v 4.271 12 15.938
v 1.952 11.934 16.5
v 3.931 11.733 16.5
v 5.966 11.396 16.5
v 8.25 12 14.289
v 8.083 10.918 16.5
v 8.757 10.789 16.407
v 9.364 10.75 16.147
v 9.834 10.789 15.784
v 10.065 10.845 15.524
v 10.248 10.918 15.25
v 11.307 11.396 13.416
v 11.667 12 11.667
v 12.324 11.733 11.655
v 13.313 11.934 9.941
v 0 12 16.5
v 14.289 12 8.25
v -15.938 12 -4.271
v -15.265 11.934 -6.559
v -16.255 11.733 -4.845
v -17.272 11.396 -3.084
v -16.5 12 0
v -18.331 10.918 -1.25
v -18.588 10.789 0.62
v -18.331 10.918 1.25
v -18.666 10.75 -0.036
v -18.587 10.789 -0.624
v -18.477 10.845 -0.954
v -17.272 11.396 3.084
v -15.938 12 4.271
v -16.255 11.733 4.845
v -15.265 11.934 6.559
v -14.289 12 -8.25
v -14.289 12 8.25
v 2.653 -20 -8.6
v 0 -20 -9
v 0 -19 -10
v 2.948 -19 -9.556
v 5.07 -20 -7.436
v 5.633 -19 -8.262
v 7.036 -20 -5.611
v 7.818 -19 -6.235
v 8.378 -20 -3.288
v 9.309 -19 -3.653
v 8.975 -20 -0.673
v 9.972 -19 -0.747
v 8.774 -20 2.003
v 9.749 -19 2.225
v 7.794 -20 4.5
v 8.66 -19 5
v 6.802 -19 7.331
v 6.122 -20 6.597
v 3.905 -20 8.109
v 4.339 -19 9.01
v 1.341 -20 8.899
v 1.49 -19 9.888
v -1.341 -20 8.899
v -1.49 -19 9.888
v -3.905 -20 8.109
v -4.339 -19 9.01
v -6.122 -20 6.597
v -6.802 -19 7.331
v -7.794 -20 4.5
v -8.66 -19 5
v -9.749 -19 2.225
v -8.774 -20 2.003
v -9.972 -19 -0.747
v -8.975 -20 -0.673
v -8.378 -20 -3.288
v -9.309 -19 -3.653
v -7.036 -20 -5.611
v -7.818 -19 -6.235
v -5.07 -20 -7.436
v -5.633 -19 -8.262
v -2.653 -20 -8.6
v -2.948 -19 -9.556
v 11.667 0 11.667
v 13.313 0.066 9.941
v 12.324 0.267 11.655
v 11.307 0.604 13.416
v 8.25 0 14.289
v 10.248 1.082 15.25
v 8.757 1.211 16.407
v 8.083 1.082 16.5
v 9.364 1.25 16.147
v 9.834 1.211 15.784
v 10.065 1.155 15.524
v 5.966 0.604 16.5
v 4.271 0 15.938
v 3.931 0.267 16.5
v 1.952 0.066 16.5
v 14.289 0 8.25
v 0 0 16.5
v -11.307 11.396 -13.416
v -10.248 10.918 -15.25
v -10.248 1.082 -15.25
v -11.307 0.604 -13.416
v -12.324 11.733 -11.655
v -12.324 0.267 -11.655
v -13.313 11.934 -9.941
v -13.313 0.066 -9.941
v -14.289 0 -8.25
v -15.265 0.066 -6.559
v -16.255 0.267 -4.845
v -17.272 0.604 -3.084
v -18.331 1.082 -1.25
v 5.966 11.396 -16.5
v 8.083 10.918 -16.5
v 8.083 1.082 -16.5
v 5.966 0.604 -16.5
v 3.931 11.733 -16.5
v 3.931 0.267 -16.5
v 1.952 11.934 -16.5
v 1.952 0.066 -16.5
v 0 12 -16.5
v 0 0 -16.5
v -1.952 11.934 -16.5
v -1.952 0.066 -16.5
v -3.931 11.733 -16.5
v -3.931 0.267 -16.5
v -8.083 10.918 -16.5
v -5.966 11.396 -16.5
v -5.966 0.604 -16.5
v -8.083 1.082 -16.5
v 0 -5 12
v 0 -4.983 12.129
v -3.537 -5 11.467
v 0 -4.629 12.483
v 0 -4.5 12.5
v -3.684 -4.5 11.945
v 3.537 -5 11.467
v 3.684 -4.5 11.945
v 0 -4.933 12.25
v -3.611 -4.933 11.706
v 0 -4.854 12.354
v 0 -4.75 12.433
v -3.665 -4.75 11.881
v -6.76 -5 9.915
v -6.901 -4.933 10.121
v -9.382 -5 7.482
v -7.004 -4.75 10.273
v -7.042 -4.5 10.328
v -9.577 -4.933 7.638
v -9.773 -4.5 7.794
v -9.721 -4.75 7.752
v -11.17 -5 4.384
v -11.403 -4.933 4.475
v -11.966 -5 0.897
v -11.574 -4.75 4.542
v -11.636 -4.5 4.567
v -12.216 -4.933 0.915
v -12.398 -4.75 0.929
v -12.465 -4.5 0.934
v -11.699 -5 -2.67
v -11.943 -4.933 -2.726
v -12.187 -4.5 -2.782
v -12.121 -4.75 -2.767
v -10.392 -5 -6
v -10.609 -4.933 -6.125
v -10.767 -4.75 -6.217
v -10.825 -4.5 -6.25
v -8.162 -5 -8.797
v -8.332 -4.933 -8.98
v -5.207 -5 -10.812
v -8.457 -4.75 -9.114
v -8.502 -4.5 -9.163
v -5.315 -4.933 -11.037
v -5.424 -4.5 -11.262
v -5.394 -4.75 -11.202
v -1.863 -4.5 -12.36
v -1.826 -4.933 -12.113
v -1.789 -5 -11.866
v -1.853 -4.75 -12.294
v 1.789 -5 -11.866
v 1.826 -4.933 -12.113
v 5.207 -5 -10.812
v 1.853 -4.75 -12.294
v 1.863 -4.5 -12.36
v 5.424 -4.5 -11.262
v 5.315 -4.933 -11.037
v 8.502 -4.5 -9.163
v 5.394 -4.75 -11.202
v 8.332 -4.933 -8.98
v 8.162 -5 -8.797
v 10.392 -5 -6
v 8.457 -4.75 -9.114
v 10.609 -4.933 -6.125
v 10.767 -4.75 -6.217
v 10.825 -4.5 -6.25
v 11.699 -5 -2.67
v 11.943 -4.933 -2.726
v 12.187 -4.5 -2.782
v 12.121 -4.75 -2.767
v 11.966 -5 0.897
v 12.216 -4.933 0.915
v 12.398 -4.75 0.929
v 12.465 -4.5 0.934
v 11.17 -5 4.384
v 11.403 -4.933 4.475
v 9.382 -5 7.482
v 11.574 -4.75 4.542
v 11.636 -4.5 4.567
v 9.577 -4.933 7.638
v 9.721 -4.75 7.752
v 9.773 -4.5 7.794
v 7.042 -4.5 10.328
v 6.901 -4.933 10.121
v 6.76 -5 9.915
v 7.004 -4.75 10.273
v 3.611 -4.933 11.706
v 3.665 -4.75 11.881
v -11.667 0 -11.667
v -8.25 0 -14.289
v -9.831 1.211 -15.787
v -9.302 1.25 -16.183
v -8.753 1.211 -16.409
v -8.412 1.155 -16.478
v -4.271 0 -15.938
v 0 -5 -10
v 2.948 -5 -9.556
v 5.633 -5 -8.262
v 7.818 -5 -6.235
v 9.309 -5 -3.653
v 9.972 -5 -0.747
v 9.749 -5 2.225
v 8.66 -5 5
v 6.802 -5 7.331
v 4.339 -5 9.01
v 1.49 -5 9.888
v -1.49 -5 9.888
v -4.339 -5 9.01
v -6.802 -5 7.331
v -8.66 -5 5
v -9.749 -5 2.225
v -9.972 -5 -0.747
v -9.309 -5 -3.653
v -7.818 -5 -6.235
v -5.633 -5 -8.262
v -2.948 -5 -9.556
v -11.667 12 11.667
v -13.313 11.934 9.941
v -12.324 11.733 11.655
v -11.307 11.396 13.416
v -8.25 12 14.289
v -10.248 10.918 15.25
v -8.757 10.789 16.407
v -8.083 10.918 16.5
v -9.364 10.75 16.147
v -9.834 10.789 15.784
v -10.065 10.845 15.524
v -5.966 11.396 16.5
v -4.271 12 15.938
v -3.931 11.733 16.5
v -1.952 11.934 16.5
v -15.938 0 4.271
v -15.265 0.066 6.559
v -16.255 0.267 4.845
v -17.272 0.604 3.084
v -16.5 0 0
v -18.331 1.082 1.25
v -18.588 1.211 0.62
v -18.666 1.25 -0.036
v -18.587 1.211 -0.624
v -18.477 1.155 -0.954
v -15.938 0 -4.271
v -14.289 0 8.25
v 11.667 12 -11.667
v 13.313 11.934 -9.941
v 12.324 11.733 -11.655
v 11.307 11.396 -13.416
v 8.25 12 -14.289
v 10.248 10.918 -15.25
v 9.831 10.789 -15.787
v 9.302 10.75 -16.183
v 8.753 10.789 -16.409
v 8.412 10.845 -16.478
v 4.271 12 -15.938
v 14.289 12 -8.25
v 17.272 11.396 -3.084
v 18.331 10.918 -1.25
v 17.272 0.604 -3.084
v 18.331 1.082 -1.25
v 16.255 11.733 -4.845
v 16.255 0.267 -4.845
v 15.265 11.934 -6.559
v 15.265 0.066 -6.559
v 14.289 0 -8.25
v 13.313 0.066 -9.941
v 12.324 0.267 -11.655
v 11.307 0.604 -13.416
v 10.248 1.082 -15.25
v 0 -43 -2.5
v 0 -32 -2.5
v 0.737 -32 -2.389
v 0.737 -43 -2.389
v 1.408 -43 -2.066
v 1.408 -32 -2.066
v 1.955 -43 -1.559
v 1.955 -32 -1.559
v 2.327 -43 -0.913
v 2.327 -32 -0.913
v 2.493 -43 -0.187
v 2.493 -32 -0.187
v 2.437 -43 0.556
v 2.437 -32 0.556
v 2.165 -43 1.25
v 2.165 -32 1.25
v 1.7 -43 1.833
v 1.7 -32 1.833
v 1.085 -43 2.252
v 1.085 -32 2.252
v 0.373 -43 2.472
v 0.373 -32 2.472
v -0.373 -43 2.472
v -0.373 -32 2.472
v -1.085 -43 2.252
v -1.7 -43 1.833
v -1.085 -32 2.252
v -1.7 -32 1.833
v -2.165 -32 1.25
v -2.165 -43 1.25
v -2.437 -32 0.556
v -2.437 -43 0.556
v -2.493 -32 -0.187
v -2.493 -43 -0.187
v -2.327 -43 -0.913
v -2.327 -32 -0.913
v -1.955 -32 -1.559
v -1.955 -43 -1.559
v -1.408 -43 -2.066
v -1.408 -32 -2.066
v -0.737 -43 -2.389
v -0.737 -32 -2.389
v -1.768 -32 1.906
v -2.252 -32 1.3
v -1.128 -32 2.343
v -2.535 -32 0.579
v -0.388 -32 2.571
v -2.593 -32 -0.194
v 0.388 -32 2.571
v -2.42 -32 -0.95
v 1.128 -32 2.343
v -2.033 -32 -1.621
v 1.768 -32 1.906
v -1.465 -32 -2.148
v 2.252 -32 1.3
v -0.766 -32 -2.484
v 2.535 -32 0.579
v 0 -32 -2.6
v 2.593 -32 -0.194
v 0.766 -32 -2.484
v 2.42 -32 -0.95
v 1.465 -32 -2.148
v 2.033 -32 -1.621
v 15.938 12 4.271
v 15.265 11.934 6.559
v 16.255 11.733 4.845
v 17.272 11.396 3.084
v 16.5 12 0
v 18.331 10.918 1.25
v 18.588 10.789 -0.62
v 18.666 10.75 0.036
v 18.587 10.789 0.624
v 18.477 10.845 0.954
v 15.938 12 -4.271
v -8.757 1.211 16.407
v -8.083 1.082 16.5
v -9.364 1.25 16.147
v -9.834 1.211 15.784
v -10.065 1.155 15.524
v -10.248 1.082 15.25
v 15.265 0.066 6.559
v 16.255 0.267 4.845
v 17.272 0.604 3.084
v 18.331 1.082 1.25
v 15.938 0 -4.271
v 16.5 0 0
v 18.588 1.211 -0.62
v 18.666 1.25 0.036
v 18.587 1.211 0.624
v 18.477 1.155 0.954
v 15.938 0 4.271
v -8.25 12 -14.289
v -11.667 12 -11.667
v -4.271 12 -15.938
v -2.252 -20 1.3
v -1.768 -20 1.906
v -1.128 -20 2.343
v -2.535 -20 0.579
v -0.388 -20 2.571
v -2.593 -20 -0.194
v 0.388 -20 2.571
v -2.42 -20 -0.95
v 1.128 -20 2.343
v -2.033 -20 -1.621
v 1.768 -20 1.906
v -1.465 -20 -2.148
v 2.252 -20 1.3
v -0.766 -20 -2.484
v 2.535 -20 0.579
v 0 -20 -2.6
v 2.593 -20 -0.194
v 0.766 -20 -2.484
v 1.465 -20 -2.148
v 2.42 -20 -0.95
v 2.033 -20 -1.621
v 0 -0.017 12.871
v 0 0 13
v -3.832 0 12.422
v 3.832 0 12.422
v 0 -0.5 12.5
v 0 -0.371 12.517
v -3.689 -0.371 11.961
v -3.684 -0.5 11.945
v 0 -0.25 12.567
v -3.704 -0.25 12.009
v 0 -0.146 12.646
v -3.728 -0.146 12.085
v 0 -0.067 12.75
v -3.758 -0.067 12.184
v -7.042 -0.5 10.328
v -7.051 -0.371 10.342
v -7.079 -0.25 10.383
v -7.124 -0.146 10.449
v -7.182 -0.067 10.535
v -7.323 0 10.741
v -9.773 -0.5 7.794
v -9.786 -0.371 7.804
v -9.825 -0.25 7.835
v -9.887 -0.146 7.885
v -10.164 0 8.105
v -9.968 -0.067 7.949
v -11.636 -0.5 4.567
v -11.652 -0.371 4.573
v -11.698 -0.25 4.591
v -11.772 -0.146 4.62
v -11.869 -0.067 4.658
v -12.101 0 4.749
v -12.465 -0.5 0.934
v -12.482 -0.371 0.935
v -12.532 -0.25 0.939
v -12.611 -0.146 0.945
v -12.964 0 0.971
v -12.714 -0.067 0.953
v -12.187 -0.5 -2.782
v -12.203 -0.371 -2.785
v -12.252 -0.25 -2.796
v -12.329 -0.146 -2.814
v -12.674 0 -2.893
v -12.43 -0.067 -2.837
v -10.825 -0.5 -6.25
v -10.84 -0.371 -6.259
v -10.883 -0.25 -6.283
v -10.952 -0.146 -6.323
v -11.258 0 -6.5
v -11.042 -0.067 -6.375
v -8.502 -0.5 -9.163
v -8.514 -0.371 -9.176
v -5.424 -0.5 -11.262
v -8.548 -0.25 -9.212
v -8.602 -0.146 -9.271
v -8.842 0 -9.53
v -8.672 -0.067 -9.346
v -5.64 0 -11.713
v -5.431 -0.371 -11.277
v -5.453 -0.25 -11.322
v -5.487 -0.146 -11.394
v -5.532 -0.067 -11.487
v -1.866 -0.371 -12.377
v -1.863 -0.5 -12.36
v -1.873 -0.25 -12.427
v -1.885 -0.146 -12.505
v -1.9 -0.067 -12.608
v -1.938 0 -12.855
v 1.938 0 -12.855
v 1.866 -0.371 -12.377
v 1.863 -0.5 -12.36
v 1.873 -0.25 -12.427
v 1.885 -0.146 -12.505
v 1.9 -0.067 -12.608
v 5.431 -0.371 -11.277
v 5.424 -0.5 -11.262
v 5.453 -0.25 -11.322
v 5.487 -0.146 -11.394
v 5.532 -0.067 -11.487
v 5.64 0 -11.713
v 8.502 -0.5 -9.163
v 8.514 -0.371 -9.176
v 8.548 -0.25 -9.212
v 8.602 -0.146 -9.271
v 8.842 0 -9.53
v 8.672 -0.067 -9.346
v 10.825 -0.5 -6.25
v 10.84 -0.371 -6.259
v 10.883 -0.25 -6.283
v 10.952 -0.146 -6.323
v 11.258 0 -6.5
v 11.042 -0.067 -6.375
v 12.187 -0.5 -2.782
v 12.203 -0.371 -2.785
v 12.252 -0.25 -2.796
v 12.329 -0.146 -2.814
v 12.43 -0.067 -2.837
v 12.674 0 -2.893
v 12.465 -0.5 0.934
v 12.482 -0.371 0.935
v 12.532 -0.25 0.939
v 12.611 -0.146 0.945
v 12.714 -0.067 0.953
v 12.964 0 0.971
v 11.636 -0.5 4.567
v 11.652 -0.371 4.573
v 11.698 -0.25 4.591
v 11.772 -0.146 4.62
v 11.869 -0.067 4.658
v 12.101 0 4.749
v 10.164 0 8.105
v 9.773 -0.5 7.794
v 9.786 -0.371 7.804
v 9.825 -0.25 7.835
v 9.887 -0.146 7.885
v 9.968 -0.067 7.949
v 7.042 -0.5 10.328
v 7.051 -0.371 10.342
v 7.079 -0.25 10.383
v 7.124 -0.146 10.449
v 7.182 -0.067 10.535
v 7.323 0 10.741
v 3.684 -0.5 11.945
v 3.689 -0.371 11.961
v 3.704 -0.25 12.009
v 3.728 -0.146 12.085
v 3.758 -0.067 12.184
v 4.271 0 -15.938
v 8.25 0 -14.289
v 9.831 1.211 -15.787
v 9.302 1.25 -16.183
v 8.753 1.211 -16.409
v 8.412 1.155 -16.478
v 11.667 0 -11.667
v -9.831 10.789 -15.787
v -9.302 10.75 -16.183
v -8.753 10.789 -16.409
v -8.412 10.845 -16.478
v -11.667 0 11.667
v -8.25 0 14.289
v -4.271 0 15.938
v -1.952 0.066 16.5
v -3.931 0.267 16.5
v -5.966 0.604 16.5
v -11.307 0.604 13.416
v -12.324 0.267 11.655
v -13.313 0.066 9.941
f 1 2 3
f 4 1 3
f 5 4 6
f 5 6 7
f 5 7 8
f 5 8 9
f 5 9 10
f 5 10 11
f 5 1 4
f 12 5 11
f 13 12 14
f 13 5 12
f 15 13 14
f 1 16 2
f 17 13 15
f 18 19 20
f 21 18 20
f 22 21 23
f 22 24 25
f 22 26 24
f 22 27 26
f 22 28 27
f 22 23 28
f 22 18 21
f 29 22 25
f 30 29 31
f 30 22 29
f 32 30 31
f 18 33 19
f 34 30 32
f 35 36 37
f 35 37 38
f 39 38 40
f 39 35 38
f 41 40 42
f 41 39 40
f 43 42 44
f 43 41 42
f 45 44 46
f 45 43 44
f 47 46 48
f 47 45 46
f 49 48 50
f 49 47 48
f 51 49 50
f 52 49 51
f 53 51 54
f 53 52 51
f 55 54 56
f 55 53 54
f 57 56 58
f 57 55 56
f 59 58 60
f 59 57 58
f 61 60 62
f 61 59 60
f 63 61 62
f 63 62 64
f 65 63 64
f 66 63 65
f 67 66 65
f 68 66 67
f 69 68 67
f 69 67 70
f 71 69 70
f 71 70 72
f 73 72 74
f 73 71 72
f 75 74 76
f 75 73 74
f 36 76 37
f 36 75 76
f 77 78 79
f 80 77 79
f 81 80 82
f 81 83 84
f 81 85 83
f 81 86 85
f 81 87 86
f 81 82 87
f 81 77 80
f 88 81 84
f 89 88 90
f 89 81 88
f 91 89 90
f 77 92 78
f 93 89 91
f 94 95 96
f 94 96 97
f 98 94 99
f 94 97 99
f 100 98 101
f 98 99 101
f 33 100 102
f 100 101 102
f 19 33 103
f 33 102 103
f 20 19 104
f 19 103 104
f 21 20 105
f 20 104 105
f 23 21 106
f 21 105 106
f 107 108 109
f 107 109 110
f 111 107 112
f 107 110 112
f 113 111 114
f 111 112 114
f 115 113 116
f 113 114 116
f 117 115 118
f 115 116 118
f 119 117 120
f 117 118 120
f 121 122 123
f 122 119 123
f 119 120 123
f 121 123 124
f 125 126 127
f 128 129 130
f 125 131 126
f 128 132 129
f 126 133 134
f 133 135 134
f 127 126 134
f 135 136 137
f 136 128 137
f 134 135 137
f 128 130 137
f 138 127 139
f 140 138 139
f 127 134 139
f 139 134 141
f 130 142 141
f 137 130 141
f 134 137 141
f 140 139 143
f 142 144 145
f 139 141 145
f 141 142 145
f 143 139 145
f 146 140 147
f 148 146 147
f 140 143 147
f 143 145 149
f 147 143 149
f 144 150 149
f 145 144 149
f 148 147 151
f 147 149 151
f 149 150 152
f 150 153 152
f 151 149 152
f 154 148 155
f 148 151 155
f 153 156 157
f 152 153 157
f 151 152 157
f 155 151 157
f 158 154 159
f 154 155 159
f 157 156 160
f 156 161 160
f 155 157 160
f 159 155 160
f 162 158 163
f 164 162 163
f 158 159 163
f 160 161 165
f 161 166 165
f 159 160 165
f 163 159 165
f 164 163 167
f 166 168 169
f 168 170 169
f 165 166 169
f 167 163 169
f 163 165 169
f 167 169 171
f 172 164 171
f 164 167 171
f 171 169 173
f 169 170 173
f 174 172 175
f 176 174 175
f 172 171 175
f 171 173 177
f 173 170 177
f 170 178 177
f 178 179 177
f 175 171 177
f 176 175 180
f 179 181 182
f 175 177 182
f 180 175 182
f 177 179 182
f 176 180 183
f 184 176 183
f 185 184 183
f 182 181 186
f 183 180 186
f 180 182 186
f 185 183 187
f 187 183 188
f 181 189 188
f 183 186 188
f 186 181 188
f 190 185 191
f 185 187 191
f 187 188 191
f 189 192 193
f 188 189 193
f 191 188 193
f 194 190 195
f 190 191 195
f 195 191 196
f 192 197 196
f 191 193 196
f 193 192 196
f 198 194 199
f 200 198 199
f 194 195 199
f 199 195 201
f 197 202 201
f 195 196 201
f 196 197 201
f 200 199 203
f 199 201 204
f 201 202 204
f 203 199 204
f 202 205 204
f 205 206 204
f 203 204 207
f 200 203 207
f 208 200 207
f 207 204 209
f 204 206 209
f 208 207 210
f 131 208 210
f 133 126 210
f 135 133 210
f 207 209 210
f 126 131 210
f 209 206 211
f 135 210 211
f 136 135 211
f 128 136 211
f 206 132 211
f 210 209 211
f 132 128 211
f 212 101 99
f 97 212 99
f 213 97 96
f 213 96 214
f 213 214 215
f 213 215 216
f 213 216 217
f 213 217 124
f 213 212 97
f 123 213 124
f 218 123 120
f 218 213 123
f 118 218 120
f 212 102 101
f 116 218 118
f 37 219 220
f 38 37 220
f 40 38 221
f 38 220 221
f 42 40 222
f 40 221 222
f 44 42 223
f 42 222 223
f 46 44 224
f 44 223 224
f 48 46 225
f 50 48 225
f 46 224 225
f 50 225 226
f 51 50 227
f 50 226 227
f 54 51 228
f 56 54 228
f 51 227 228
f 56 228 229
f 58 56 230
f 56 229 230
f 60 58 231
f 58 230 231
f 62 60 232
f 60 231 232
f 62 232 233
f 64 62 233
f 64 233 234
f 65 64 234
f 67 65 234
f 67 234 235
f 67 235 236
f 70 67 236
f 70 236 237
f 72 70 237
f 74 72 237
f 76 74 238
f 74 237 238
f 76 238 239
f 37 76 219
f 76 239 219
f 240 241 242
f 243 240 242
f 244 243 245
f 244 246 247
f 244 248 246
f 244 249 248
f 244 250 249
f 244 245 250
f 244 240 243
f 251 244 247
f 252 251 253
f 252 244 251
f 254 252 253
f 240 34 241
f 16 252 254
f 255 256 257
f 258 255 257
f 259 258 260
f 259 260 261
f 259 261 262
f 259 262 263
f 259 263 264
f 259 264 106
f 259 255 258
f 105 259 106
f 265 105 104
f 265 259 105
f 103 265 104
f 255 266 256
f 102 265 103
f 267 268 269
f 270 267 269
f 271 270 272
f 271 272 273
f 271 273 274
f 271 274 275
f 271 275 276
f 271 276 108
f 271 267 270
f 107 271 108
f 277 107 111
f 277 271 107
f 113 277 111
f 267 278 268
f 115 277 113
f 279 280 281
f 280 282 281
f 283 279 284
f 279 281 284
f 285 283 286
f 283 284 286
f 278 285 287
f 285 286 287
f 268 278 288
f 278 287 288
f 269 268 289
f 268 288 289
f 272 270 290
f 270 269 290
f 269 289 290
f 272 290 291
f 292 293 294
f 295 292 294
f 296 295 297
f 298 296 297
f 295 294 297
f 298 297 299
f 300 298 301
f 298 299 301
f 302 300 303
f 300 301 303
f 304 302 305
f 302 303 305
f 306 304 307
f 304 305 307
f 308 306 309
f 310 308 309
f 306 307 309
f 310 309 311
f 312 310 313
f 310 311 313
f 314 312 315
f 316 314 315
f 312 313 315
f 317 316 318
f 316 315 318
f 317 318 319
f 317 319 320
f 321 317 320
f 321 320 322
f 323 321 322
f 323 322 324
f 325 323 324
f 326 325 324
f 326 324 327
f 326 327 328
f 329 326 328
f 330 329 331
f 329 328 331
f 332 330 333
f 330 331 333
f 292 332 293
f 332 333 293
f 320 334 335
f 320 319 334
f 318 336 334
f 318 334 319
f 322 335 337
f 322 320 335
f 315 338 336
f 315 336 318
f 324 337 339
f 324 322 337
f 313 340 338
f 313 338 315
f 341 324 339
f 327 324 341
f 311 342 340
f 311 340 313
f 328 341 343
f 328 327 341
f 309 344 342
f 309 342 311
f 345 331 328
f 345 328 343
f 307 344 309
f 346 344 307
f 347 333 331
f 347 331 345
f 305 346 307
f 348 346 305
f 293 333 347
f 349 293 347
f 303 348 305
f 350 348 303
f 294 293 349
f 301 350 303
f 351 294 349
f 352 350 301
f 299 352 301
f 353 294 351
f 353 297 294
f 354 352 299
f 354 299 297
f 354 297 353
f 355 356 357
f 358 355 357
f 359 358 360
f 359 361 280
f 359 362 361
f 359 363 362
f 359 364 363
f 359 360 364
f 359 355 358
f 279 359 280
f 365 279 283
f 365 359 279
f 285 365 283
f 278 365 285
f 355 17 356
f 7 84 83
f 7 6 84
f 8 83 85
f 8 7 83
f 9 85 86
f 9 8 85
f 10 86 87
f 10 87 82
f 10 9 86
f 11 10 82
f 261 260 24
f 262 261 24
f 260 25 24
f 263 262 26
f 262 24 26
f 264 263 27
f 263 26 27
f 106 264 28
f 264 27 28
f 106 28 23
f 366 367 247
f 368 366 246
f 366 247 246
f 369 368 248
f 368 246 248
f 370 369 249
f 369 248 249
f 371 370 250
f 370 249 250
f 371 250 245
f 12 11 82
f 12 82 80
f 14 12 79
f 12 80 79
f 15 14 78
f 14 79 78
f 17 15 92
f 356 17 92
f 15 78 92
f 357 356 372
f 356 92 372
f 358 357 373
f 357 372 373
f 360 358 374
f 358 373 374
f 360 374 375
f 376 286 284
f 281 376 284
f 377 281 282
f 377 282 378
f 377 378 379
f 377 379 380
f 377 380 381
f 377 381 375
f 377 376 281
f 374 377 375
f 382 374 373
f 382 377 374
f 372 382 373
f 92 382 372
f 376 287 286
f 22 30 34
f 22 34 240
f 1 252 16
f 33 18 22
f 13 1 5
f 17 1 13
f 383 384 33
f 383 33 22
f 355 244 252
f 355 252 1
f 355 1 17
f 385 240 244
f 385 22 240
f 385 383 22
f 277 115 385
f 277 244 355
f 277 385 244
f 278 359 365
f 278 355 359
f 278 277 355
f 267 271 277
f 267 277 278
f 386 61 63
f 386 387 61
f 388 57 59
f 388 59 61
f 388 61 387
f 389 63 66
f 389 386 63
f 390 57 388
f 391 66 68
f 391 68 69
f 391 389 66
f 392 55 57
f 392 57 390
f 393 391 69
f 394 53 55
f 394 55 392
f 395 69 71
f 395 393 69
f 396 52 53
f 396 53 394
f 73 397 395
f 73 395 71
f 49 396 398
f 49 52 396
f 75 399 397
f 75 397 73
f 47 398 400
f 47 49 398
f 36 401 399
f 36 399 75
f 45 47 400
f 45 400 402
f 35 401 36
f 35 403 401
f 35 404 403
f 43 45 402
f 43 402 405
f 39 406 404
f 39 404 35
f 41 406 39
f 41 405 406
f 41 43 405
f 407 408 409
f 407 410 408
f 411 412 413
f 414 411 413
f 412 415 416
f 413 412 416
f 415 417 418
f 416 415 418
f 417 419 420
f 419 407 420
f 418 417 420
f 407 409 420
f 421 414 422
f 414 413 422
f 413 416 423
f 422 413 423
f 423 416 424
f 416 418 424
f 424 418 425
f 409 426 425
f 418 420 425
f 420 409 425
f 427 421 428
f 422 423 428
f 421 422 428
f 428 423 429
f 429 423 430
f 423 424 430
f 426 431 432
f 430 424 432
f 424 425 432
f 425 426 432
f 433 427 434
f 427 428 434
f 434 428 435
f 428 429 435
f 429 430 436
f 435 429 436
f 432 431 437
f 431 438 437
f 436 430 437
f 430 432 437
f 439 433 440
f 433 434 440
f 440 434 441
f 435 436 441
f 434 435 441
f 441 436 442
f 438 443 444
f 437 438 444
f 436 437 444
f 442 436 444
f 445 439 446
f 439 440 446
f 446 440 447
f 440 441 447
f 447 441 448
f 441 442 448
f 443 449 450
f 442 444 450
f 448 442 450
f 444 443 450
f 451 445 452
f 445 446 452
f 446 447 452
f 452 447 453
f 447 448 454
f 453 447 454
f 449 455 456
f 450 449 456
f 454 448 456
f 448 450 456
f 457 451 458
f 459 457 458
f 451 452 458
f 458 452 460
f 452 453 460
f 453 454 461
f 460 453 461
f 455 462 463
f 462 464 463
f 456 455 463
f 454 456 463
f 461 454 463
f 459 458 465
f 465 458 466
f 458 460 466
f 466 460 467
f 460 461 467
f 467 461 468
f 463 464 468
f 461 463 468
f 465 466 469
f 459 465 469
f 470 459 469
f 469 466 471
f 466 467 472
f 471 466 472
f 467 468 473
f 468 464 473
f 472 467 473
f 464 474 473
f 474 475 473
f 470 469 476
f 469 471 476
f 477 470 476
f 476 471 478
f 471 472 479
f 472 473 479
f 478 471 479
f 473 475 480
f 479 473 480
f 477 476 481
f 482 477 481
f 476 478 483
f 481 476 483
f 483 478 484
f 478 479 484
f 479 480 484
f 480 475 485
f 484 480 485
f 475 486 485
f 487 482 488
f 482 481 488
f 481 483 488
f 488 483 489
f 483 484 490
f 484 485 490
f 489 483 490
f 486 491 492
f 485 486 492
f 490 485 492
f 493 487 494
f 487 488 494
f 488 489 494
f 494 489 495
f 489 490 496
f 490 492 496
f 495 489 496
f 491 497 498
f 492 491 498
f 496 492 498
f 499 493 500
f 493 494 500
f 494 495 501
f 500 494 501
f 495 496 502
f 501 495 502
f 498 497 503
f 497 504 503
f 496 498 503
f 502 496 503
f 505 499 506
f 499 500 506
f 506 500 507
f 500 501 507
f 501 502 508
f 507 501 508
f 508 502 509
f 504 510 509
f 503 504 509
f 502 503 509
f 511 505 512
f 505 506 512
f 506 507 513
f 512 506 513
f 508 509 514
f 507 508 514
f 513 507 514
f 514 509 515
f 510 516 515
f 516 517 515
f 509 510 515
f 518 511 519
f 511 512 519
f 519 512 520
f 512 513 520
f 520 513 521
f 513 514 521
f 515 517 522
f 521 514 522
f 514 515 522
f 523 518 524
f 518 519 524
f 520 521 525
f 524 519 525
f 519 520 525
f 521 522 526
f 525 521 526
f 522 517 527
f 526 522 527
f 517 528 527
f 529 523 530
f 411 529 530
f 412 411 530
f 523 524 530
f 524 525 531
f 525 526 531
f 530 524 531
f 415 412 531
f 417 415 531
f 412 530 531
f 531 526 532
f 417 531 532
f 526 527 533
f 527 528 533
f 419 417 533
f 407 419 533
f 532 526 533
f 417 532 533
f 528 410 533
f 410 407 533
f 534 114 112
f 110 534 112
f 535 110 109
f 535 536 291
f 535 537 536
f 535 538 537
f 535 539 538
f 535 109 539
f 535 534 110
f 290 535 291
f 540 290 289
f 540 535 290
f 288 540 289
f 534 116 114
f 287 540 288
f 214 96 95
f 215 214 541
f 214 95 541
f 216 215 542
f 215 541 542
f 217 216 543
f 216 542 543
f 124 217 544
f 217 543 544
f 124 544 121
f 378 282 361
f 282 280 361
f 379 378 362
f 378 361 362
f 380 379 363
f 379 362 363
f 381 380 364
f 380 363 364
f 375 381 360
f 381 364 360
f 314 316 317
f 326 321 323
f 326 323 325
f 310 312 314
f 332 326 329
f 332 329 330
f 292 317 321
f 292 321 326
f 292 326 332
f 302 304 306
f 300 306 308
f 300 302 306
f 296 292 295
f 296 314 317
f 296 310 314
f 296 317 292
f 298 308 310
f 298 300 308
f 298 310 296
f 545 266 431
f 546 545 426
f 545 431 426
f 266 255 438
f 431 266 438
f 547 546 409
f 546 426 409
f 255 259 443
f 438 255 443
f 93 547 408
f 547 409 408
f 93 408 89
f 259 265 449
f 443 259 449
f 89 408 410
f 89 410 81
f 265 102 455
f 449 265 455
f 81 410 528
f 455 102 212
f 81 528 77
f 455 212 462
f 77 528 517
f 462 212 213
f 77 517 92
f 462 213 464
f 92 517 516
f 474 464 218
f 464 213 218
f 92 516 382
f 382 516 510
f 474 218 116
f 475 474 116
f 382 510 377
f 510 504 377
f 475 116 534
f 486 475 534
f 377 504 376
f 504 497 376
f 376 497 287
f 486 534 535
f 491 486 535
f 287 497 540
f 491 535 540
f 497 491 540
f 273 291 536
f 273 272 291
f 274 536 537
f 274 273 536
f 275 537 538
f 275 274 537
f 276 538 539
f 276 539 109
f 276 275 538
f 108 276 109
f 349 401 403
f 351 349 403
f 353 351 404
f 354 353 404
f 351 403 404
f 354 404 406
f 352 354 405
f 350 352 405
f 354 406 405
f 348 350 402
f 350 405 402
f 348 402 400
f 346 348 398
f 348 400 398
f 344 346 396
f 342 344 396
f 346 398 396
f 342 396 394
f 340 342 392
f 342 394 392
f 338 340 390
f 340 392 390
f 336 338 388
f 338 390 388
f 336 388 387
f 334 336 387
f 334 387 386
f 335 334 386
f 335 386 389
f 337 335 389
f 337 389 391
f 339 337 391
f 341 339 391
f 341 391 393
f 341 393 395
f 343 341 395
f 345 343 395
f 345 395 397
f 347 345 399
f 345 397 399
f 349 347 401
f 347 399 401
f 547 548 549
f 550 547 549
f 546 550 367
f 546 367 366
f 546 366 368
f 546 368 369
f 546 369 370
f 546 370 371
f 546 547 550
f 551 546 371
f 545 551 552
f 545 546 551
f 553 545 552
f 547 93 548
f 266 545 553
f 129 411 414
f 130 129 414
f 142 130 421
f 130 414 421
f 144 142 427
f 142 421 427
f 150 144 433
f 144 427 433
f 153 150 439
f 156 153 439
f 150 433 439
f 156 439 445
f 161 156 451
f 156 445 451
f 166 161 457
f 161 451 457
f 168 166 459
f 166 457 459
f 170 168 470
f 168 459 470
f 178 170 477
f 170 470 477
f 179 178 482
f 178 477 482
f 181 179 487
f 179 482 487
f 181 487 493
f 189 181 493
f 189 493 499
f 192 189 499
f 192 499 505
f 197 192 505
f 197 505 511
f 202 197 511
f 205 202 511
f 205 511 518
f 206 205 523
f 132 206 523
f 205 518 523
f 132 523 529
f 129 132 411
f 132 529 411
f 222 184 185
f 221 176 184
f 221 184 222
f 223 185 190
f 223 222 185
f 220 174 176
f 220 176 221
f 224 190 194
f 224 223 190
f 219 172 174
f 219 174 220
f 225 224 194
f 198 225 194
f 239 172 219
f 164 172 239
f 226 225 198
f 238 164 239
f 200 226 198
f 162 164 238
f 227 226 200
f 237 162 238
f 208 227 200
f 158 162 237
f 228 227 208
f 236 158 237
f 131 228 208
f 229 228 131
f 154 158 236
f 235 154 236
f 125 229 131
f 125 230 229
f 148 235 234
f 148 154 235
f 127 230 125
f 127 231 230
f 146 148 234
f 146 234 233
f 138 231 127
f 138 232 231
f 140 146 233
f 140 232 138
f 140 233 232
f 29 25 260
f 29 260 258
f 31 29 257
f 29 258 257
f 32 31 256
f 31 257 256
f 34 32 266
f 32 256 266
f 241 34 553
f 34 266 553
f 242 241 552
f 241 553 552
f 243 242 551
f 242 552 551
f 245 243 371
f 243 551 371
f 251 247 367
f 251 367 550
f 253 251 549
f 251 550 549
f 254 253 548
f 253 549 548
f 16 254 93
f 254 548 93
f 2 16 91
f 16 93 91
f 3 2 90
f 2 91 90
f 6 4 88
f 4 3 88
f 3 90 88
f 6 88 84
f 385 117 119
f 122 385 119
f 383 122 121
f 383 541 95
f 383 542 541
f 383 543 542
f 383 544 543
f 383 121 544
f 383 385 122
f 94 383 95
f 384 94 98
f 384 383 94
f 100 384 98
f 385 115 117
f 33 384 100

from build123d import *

# Parameters (mm, degrees)
BOSS_EXTRUDE2_DEPTH  = 12
SKETCH4_OUTSIDE_W    = 92.038
SKETCH4_OUTSIDE_H    = 86.932
SKETCH4_OUTSIDE_R    = 16.5
CUT_EXTRUDE6_DEPTH   = 12
CUT_EXTRUDE6_DRAFT   = -60
SKETCH5_OUTSIDE_W    = 92.038
SKETCH5_OUTSIDE_H    = 86.932
SKETCH5_OUTSIDE_R    = 16.5
CUT_EXTRUDE7_DEPTH   = 12
CUT_EXTRUDE7_DRAFT   = -60
FILLET1_R            = 2.5
SKETCH9_R            = 12.5
BOSS_EXTRUDE6_DEPTH  = 5
SKETCH11_R           = 10
BOSS_EXTRUDE8_DEPTH  = 15
CHAMFER1_SIZE        = 1
FILLET2_R            = 0.5
SKETCH12_R           = 2.6
BOSS_EXTRUDE9_DEPTH  = 12
SKETCH13_R           = 2.5
BOSS_EXTRUDE10_DEPTH = 11


with BuildPart() as part:
    # Sketch3 → Boss-Extrude2 (new body)
    with BuildSketch(Plane(origin=(0, 0, 0), x_dir=(1, 0, 0), z_dir=(0, 1, 0))):
        Polygon((19.052558883, 0), (9.526279442, 16.5), (-9.526279442, 16.5), (-19.052558883, 0), (-9.526279442, -16.5), (9.526279442, -16.5), align=None)
    extrude(amount=BOSS_EXTRUDE2_DEPTH)


with BuildPart() as cut_extrude6_tool:
    # Sketch4 outside → Cut-Extrude6 (with draft: the straight prism first)
    with BuildSketch(Plane(origin=(0, 12, 0), x_dir=(1, 0, 0), z_dir=(0, 1, 0))):
        Rectangle(SKETCH4_OUTSIDE_W, SKETCH4_OUTSIDE_H)
        Circle(SKETCH4_OUTSIDE_R, mode=Mode.SUBTRACT)
    extrude(amount=-CUT_EXTRUDE6_DEPTH)
    # Cut-Extrude6: the draft: its side faces are tilted about the plane it starts from
    cut_extrude6_sides = [cut_extrude6_tool.faces().sort_by_distance(p)[0] for p in [
        (0, 6, 43.466),
        (46.019, 6, 0),
        (0, 6, -43.466),
        (-46.019, 6, 0),
        (-16.5, 6, 0),
    ]]
    draft(cut_extrude6_sides, Plane(origin=(0, 12, 0), x_dir=(1, 0, 0), z_dir=(0, 1, 0)), CUT_EXTRUDE6_DRAFT)


with BuildPart() as part_1:
    add(part.part)

    # Cut-Extrude6: cut by cut_extrude6_tool
    add(cut_extrude6_tool.part, mode=Mode.SUBTRACT)


with BuildPart() as cut_extrude7_tool:
    # Sketch5 outside → Cut-Extrude7 (with draft: the straight prism first)
    with BuildSketch(Plane.XZ):
        Rectangle(SKETCH5_OUTSIDE_W, SKETCH5_OUTSIDE_H)
        Circle(SKETCH5_OUTSIDE_R, mode=Mode.SUBTRACT)
    extrude(amount=-CUT_EXTRUDE7_DEPTH)
    # Cut-Extrude7: the draft: its side faces are tilted about the plane it starts from
    cut_extrude7_sides = [cut_extrude7_tool.faces().sort_by_distance(p)[0] for p in [
        (0, 6, -43.466),
        (46.019, 6, 0),
        (0, 6, 43.466),
        (-46.019, 6, 0),
        (-16.5, 6, 0),
    ]]
    draft(cut_extrude7_sides, Plane.XZ, CUT_EXTRUDE7_DRAFT)


with BuildPart() as part_2:
    add(part_1.part)

    # Cut-Extrude7: cut by cut_extrude7_tool
    add(cut_extrude7_tool.part, mode=Mode.SUBTRACT)

    # Fillet1
    fillet1_edges = [part_2.edges().sort_by_distance(p)[0] for p in [
        (-19.052558883, 6, 0),
        (-9.526279442, 6, -16.5),
        (9.526279442, 6, -16.5),
        (19.052558883, 6, 0),
        (-9.526279442, 6, 16.5),
        (9.526279442, 6, 16.5),
    ]]
    fillet(fillet1_edges, radius=FILLET1_R)

    # Sketch9 → Boss-Extrude6 (add)
    with BuildSketch(Plane.XZ):
        with Locations(Location((0, 0, 0), (0, 0, 90))):
            Circle(SKETCH9_R)
    extrude(amount=BOSS_EXTRUDE6_DEPTH)

    # Sketch11 → Boss-Extrude8 (add)
    with BuildSketch(Plane.XZ.offset(5)):
        with Locations(Location((0, 0, 0), (0, 0, 270))):
            Circle(SKETCH11_R)
    extrude(amount=BOSS_EXTRUDE8_DEPTH)

    # Chamfer1
    chamfer1_edges = [part_2.edges().sort_by_distance(p)[0] for p in [
        (0, -20, 10),
    ]]
    chamfer(chamfer1_edges, length=CHAMFER1_SIZE)

    # Fillet2
    fillet2_edges = [part_2.edges().sort_by_distance(p)[0] for p in [
        (0, 0, -12.5),
        (0, -5, -12.5),
    ]]
    fillet(fillet2_edges, radius=FILLET2_R)

    # Sketch12 → Boss-Extrude9 (add)
    with BuildSketch(Plane.XZ.offset(20)):
        with Locations(Location((0, 0, 0), (0, 0, 270))):
            Circle(SKETCH12_R)
    extrude(amount=BOSS_EXTRUDE9_DEPTH)

    # Sketch13 → Boss-Extrude10 (add)
    with BuildSketch(Plane.XZ.offset(32)):
        with Locations(Location((0, 0, 0), (0, 0, 270))):
            Circle(SKETCH13_R)
    extrude(amount=BOSS_EXTRUDE10_DEPTH)


solid = part_2.part
